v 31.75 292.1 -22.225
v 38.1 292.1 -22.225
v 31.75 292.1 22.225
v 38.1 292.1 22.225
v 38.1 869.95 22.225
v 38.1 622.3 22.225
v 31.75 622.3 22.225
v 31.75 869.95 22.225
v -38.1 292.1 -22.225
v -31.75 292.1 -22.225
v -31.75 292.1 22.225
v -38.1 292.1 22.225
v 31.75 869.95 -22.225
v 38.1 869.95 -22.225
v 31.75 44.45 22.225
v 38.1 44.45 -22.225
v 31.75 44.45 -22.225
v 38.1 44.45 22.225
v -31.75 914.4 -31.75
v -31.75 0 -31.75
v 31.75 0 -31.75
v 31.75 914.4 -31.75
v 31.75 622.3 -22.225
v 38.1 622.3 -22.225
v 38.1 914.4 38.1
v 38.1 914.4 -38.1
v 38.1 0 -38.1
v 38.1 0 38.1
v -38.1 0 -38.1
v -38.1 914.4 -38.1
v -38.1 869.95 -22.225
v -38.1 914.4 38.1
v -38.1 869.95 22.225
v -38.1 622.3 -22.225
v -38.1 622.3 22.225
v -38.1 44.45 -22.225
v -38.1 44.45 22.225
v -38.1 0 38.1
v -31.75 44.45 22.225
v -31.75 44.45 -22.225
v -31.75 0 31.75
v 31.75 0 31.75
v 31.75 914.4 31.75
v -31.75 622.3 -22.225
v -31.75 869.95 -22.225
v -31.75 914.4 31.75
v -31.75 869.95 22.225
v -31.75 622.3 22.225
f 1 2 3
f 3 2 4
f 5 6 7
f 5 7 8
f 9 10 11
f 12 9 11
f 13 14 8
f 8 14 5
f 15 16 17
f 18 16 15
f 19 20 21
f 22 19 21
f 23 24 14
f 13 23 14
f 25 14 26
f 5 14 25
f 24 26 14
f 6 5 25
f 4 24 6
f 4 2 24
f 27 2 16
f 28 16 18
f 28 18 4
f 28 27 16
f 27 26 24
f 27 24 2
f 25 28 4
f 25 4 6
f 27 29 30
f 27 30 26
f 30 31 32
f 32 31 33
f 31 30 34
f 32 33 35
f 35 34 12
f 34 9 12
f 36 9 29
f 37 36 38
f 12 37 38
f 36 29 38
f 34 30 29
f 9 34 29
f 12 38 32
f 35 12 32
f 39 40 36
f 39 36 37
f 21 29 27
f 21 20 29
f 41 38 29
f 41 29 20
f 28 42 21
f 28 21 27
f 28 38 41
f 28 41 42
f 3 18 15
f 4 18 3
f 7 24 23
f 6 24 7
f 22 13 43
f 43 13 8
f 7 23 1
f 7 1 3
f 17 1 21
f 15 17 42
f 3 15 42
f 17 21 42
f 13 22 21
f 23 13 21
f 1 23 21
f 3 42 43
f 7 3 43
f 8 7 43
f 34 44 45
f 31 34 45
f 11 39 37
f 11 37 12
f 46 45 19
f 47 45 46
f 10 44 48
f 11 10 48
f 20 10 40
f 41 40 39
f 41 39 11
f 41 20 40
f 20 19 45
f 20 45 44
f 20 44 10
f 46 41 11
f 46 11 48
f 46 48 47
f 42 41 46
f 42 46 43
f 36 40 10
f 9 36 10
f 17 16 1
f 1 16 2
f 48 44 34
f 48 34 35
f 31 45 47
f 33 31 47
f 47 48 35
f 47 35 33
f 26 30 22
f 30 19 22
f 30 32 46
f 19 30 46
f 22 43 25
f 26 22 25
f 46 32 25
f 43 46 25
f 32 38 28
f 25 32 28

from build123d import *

# Parameters (mm, degrees)
F0_W     = 76.2
F0_H     = 76.2
F0_W_2   = 63.5
F0_H_2   = 63.5
F1_DEPTH = 914.4
F2_W     = 247.65
F2_H     = 44.45
F3_DEPTH = 76.201


with BuildPart() as f1:
    # F0 (on Front) → F1 (new body)
    with BuildSketch(Plane.XZ):
        Rectangle(F0_W, F0_H)
        Rectangle(F0_W_2, F0_H_2, mode=Mode.SUBTRACT)
    extrude(amount=-F1_DEPTH)

    # F2 (on face) → F3 (cut, through all)
    with BuildSketch(Plane.YZ.offset(38.1)):
        with Locations((168.275, 0)):
            Rectangle(F2_W, F2_H)
        with Locations((746.125, 0)):
            Rectangle(F2_W, F2_H)
    extrude(amount=-F3_DEPTH, mode=Mode.SUBTRACT)


solid = f1.part
